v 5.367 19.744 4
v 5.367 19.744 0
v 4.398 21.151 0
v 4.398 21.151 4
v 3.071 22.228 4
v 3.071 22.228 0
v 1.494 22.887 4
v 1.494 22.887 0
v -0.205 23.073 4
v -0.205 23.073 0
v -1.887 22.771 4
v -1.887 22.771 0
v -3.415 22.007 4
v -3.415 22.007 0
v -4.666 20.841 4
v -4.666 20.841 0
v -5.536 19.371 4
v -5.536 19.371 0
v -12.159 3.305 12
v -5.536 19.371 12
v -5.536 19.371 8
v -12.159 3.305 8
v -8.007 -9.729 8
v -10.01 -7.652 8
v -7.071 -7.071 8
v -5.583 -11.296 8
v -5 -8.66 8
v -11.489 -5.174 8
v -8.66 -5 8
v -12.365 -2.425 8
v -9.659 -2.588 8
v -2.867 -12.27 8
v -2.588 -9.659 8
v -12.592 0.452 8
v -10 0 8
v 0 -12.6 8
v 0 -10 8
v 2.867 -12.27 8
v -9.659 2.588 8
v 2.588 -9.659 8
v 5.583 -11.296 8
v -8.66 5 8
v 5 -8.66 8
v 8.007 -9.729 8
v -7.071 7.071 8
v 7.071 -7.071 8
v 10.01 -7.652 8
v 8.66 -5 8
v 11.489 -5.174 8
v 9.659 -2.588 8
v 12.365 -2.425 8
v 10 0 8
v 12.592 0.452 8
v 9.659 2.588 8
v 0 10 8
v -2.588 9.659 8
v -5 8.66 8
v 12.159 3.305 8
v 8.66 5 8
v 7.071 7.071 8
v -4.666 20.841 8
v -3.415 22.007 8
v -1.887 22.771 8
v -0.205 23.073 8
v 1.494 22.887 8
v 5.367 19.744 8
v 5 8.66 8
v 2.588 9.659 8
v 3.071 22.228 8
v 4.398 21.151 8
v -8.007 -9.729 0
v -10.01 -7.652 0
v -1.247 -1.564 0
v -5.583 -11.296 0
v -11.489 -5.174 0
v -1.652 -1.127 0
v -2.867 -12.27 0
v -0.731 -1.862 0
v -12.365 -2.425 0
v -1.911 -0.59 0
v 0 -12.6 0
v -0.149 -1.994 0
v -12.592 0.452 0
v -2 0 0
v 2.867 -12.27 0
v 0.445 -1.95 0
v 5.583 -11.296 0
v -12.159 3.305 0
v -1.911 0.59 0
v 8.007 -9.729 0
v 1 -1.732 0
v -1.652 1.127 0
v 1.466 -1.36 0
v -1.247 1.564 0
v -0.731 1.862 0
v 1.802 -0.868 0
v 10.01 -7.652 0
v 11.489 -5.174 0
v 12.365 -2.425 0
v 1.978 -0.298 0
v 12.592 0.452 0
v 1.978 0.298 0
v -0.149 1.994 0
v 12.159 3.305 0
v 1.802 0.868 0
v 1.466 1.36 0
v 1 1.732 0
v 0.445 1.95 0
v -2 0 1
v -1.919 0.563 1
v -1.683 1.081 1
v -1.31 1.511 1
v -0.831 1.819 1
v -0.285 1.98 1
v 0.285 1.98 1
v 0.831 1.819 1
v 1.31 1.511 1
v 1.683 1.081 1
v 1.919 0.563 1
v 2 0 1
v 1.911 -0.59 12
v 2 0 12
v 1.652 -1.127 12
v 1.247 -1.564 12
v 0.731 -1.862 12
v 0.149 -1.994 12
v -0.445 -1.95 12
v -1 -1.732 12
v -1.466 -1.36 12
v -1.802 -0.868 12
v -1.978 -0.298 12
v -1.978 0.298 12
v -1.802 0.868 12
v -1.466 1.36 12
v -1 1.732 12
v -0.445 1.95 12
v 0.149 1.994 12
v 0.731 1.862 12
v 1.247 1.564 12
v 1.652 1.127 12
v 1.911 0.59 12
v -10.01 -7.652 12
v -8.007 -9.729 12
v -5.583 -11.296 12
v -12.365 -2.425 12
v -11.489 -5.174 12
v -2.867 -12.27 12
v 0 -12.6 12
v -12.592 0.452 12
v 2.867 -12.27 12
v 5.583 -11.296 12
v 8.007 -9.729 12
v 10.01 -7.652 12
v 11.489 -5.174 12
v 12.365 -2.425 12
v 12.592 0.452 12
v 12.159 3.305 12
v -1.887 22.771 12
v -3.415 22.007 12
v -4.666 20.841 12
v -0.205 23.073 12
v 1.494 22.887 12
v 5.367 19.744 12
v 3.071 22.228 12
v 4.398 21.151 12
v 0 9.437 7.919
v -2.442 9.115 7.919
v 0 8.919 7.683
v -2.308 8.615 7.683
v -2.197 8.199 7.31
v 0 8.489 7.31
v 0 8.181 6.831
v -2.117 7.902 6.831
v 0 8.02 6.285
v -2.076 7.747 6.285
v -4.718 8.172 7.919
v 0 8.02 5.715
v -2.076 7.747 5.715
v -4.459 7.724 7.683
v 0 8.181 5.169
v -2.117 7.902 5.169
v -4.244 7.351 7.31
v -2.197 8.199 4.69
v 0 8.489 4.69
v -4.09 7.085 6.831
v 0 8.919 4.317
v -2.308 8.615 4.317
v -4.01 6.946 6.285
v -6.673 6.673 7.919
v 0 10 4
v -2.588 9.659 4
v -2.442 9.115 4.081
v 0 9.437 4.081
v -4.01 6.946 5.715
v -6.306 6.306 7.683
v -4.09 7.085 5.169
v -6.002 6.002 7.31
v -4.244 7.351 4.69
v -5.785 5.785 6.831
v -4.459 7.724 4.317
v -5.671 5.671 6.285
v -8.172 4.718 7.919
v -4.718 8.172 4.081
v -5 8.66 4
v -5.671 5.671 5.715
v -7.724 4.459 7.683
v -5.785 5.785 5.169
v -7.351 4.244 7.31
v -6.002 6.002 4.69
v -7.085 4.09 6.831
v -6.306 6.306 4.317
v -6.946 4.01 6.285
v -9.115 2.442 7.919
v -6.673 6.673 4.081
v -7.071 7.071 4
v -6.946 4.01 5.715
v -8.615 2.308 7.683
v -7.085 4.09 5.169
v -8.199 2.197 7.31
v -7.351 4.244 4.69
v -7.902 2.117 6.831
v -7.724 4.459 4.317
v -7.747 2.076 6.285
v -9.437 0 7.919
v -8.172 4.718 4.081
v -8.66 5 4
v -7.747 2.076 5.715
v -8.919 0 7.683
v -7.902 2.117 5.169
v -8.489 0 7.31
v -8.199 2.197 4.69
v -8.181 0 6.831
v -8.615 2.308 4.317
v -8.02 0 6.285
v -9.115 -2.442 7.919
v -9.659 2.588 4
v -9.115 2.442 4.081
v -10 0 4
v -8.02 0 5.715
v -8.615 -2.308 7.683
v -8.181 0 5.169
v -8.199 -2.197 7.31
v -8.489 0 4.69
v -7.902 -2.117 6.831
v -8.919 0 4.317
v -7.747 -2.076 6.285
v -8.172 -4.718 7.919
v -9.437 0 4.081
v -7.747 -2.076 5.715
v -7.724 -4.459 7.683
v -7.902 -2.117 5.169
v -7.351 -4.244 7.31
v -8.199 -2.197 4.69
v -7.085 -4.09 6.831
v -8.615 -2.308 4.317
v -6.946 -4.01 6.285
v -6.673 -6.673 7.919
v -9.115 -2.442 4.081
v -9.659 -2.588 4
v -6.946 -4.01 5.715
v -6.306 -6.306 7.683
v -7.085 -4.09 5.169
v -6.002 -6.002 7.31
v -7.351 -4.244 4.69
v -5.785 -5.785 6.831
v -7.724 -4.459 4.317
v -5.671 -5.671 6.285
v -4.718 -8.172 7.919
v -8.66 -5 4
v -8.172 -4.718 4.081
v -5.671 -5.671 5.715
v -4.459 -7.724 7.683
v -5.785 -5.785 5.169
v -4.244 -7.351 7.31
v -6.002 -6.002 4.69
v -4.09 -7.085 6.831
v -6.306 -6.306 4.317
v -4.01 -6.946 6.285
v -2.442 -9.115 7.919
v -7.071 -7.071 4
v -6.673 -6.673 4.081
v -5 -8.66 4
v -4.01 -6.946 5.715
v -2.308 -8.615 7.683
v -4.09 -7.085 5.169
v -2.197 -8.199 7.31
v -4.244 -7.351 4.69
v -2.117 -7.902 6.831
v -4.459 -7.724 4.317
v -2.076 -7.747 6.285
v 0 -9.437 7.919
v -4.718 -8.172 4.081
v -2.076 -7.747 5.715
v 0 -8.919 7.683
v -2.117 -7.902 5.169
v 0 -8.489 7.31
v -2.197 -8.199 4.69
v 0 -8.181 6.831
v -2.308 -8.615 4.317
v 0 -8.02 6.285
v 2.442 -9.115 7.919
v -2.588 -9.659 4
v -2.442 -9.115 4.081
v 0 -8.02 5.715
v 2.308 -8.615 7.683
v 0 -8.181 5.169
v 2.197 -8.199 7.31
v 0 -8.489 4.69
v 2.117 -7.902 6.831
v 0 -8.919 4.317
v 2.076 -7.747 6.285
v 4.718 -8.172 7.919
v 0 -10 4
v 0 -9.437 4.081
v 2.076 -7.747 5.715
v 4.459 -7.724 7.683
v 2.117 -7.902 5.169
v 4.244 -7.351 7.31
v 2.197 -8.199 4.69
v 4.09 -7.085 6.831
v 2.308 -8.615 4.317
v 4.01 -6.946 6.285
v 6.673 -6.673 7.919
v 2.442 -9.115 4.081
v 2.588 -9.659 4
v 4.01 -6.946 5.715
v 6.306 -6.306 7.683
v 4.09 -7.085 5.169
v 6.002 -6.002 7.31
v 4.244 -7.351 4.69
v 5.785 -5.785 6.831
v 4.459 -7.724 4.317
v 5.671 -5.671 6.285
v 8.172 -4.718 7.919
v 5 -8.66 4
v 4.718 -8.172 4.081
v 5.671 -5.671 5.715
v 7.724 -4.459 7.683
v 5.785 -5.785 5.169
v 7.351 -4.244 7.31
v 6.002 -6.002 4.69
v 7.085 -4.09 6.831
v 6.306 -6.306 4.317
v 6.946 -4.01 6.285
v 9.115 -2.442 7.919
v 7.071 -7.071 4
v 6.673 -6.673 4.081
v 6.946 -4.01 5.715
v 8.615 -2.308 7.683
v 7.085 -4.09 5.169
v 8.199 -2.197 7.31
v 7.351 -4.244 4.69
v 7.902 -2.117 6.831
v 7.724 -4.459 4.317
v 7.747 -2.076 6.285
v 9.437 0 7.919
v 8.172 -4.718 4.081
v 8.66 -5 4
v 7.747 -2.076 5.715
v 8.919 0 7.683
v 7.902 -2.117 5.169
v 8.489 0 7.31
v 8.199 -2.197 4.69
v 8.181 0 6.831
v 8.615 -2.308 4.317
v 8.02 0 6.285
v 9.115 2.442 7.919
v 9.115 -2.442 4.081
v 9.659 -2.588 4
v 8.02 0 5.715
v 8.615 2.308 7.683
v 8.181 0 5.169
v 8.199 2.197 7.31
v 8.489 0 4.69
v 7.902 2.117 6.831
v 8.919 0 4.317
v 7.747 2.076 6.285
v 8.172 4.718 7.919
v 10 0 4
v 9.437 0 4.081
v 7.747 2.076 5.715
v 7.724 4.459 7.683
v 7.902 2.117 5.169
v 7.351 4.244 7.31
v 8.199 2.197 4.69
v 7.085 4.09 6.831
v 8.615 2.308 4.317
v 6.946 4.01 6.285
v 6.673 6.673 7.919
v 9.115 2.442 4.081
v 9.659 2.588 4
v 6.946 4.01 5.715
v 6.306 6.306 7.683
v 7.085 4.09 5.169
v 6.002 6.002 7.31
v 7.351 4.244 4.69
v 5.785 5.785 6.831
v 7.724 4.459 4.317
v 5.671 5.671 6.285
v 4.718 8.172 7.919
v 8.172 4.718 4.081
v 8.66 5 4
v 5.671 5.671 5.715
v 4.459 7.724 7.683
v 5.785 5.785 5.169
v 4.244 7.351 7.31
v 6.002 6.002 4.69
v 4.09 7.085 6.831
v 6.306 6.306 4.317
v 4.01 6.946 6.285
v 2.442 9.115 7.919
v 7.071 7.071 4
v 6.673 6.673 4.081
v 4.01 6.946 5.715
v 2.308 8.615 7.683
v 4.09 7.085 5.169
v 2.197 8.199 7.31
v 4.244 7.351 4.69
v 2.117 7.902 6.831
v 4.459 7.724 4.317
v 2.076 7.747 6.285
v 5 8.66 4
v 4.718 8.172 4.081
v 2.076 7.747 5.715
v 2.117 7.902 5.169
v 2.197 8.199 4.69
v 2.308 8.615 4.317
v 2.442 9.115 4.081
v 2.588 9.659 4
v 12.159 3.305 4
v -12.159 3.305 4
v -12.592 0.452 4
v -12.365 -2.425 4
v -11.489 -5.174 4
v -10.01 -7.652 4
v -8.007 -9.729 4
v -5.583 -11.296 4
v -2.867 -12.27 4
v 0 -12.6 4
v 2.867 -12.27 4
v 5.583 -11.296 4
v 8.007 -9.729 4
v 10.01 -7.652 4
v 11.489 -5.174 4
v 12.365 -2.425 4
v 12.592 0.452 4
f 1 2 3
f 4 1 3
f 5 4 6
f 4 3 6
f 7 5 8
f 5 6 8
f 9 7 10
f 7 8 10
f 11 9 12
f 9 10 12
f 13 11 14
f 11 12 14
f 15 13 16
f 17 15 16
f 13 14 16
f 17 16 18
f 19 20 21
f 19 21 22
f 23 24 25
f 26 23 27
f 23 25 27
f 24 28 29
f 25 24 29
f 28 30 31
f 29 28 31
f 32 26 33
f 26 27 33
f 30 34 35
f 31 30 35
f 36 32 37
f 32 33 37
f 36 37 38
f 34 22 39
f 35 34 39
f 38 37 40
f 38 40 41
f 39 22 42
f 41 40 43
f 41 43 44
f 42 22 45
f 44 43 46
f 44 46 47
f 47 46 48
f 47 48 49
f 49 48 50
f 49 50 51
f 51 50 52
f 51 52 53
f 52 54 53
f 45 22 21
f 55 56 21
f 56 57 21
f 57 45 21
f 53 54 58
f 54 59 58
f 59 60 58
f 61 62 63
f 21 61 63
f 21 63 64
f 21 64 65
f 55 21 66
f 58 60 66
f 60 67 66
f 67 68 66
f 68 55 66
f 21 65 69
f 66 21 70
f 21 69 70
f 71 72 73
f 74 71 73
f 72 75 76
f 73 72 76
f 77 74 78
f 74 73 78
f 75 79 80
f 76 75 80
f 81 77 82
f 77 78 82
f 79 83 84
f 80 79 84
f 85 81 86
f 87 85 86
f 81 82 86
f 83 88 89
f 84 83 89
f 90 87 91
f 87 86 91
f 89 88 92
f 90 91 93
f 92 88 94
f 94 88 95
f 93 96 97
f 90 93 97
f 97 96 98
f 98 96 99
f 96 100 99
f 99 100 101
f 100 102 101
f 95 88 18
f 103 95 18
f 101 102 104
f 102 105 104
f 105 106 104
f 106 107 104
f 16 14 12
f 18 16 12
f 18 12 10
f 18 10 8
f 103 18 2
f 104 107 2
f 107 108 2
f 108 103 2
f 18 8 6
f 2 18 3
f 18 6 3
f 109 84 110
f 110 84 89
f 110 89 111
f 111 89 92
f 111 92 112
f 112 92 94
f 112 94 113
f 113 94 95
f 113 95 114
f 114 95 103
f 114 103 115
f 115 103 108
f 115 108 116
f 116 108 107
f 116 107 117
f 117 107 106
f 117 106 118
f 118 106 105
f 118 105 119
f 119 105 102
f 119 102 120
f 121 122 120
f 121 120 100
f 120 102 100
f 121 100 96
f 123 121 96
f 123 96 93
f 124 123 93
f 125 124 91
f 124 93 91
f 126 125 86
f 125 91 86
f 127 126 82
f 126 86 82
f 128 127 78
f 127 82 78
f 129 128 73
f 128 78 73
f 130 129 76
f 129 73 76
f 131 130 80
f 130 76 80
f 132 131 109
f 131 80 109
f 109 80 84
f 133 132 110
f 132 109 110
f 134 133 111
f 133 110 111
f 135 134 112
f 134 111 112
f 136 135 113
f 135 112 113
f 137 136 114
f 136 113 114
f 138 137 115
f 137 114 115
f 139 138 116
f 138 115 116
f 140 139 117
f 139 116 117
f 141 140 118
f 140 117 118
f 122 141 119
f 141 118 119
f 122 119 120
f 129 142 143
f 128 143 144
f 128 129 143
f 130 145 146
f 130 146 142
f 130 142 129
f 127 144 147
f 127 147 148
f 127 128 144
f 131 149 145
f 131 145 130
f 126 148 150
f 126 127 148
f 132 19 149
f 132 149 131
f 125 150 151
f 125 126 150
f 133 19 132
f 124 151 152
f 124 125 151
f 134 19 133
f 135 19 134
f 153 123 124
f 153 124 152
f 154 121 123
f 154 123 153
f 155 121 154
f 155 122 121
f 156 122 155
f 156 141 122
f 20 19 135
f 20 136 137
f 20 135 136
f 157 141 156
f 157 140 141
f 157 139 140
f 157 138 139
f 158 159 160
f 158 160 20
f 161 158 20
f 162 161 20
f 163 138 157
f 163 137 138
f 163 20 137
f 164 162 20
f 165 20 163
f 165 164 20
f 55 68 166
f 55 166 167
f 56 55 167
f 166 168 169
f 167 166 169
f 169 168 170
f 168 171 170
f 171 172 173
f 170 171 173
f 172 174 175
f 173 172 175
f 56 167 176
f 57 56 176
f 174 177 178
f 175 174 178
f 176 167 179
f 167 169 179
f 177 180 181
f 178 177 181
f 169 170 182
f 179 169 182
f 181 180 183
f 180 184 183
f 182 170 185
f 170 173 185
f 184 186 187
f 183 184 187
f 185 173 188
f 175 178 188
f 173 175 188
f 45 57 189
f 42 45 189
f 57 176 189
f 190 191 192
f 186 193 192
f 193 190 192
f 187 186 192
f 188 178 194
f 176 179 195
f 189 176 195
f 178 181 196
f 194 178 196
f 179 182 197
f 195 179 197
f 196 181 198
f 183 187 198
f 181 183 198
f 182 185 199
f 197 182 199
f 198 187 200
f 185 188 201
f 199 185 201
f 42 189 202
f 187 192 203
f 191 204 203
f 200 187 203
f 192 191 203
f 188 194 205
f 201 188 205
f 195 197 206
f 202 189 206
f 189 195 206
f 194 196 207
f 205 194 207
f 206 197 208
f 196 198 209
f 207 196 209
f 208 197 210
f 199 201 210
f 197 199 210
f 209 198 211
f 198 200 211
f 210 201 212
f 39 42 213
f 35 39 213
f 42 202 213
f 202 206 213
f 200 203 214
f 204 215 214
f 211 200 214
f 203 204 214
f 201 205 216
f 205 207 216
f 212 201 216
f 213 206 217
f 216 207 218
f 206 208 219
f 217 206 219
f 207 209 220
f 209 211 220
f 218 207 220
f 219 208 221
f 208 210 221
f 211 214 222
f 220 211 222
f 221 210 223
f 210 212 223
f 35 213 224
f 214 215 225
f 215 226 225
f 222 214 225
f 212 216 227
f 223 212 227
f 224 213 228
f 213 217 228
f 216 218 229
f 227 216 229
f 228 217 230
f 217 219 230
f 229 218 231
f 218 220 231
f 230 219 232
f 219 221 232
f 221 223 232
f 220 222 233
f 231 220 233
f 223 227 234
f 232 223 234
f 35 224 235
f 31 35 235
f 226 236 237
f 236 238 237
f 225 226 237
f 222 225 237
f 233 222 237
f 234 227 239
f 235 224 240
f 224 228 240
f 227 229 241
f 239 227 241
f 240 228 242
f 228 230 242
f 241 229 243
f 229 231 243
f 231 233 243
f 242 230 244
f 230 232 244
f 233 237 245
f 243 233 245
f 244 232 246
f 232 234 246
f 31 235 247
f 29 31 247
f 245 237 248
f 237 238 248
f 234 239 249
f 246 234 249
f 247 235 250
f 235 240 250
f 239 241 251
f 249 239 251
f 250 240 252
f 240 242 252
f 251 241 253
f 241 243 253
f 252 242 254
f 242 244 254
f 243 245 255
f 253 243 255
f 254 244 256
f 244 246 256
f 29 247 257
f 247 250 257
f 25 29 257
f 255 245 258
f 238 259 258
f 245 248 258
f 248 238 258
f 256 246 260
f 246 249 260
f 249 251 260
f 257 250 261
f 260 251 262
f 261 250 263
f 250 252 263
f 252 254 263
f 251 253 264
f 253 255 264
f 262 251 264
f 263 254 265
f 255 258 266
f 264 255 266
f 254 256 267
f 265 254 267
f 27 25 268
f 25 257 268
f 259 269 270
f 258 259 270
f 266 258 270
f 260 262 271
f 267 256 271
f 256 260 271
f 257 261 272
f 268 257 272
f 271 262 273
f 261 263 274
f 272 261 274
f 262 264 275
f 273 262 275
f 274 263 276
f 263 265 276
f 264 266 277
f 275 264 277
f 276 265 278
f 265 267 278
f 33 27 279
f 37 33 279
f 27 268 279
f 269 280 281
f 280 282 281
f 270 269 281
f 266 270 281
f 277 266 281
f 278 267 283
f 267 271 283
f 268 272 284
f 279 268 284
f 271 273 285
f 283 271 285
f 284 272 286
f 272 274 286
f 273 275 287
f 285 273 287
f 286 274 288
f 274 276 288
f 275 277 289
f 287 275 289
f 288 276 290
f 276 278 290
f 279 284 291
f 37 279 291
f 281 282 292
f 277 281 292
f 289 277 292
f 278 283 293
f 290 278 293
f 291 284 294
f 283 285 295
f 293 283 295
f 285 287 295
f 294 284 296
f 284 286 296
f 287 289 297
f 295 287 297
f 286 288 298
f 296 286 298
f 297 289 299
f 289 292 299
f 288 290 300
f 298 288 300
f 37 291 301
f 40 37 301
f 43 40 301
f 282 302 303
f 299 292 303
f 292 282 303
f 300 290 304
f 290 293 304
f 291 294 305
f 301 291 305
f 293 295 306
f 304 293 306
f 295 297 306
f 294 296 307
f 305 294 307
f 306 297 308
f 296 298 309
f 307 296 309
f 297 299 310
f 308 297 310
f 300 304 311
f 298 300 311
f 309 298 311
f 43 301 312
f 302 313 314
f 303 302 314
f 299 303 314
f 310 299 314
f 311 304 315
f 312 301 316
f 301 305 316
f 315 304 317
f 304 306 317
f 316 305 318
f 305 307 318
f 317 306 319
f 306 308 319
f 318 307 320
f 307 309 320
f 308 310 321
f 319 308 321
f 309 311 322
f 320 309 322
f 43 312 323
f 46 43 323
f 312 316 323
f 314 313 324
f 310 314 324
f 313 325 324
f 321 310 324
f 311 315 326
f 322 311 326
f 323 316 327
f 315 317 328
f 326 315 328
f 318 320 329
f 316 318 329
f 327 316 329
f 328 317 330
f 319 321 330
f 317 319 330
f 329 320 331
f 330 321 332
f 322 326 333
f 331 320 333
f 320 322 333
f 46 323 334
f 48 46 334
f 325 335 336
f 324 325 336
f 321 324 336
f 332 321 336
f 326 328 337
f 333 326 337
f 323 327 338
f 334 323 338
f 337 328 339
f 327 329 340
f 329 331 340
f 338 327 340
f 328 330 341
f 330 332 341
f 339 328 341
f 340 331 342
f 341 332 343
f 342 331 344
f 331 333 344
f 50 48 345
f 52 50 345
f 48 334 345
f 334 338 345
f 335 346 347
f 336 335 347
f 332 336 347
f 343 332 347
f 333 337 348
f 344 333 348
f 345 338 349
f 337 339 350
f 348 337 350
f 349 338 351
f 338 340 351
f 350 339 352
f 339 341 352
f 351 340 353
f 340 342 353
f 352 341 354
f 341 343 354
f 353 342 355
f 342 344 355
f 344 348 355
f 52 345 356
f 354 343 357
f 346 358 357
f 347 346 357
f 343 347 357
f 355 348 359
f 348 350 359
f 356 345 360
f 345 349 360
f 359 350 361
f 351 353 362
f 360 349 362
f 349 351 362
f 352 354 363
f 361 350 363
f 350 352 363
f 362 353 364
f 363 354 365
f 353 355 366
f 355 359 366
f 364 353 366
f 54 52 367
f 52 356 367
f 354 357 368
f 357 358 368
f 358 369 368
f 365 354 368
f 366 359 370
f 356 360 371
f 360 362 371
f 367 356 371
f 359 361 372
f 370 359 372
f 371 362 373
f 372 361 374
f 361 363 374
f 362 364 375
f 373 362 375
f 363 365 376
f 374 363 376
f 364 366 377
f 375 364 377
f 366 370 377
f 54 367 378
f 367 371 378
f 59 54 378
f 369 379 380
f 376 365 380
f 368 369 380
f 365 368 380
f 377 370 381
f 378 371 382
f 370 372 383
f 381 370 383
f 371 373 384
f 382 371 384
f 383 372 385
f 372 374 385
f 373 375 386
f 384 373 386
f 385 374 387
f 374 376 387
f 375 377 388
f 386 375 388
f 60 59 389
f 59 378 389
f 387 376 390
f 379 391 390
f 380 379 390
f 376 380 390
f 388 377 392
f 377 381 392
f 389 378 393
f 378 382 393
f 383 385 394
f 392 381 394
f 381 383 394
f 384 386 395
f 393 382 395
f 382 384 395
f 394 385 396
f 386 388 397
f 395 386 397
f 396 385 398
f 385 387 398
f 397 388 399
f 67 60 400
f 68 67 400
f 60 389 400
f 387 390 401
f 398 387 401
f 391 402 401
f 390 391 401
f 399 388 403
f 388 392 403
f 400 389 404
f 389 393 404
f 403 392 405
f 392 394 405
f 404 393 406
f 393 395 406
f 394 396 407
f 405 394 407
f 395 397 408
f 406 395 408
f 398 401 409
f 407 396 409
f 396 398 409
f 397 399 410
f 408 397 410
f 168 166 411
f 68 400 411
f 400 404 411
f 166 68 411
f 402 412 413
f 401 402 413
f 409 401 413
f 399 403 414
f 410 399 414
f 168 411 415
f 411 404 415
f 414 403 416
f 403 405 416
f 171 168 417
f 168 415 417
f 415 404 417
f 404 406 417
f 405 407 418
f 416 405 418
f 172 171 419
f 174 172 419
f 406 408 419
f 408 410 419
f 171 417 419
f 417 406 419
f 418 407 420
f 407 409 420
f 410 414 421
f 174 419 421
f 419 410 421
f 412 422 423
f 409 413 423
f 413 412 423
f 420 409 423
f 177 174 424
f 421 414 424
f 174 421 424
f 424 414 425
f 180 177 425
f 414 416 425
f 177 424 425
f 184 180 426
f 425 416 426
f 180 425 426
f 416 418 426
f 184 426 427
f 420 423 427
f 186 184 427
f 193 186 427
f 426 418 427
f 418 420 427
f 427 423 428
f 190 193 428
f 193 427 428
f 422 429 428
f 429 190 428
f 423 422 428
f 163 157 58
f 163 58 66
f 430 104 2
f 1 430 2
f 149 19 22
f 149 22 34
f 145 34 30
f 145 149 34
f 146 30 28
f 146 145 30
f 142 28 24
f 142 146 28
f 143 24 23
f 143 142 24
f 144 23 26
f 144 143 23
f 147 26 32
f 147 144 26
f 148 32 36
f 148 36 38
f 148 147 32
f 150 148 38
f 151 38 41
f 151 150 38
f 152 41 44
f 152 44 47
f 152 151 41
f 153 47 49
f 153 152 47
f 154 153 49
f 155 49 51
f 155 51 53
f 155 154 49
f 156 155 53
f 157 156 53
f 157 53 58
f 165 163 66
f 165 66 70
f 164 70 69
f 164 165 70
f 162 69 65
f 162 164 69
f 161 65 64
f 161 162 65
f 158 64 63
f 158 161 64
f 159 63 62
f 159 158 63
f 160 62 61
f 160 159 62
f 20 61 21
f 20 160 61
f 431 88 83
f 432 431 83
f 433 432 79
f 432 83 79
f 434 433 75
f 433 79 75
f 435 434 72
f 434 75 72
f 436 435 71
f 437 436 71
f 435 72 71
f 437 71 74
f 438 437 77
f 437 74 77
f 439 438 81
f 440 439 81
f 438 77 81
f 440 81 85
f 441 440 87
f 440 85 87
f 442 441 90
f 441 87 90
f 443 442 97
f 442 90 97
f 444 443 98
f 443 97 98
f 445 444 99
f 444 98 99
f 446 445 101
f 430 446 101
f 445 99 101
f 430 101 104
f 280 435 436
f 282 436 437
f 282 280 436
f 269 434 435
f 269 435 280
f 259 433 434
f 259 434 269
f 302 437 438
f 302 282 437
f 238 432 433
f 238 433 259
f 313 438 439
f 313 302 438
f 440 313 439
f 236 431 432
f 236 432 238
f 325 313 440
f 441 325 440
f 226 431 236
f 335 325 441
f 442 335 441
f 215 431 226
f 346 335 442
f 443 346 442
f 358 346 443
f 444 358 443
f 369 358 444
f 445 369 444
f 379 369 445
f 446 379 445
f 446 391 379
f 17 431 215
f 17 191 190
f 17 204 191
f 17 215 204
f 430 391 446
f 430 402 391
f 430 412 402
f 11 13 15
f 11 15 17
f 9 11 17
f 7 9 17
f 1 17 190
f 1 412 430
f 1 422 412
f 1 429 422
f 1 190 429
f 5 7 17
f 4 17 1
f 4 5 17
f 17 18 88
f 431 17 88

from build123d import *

# Parameters (mm, degrees)
EXTRUDE_1_DEPTH     = 4
SKETCH_2_R          = 8
EXTRUDE_2_DEPTH     = 4
SKETCH_12_W         = 4
SKETCH_12_H         = 2
SKETCH_13_R         = 2
SKETCH_14_R         = 2
CUT_EXTRUDE_1_DEPTH = 1
SKETCH_15_R         = 2
CUT_EXTRUDE_2_DEPTH = 13


with BuildPart() as part:
    # 草图1 → 凸台-拉伸1 (new body)
    with BuildSketch(Plane.XY):
        with BuildLine():
            ThreePointArc((-12.158788541, 3.305126504), (0, -12.6), (12.158788541, 3.305126504))
            Line((12.158788541, 3.305126504), (5.366883622, 19.743511481))
            ThreePointArc((5.366883622, 19.743511481), (-0.204686635, 23.072677305), (-5.535757021, 19.370592925))
            Line((-5.535757021, 19.370592925), (-12.158788541, 3.305126504))
        make_face()
    extrude_1 = extrude(amount=EXTRUDE_1_DEPTH)

    # 草图2 → 凸台-拉伸2 (add)
    with BuildSketch(Plane.XY.offset(4)):
        Circle(SKETCH_2_R)
    extrude(amount=EXTRUDE_2_DEPTH)

    # 镜向1: 凸台-拉伸1 across plane
    add(extrude_1.mirror(Plane.XY.offset(6)))

    # 草图12 → 旋转3 (revolve)
    with BuildSketch(Plane(origin=(0, 0, 0), x_dir=(0, 0, -1), z_dir=(1, 0, 0))):
        with Locations((-6, 9)):
            Rectangle(SKETCH_12_W, SKETCH_12_H)
    revolve(axis=Axis((0, 0, -2.657619659), (0, 0, 1)))

    # 草图13 → 切除-旋转1 (revolve, cut)
    with BuildSketch(Plane(origin=(0, 0, 0), x_dir=(0, 0, -1), z_dir=(1, 0, 0))):
        with Locations((-6, 10)):
            Circle(SKETCH_13_R)
    revolve(axis=Axis((0, 0, -2.657619659), (0, 0, 1)), mode=Mode.SUBTRACT)

    # 草图14 → 切除-拉伸1 (cut)
    with BuildSketch(Plane(origin=(0, 0, 0), x_dir=(-1, 0, 0), z_dir=(0, 0, -1))):
        Circle(SKETCH_14_R)
    extrude(amount=-CUT_EXTRUDE_1_DEPTH, mode=Mode.SUBTRACT)

    # 草图15 → 切除-拉伸2 (cut, through all)
    with BuildSketch(Plane.XY.offset(12)):
        Circle(SKETCH_15_R)
    extrude(amount=-CUT_EXTRUDE_2_DEPTH, mode=Mode.SUBTRACT)


solid = part.part
